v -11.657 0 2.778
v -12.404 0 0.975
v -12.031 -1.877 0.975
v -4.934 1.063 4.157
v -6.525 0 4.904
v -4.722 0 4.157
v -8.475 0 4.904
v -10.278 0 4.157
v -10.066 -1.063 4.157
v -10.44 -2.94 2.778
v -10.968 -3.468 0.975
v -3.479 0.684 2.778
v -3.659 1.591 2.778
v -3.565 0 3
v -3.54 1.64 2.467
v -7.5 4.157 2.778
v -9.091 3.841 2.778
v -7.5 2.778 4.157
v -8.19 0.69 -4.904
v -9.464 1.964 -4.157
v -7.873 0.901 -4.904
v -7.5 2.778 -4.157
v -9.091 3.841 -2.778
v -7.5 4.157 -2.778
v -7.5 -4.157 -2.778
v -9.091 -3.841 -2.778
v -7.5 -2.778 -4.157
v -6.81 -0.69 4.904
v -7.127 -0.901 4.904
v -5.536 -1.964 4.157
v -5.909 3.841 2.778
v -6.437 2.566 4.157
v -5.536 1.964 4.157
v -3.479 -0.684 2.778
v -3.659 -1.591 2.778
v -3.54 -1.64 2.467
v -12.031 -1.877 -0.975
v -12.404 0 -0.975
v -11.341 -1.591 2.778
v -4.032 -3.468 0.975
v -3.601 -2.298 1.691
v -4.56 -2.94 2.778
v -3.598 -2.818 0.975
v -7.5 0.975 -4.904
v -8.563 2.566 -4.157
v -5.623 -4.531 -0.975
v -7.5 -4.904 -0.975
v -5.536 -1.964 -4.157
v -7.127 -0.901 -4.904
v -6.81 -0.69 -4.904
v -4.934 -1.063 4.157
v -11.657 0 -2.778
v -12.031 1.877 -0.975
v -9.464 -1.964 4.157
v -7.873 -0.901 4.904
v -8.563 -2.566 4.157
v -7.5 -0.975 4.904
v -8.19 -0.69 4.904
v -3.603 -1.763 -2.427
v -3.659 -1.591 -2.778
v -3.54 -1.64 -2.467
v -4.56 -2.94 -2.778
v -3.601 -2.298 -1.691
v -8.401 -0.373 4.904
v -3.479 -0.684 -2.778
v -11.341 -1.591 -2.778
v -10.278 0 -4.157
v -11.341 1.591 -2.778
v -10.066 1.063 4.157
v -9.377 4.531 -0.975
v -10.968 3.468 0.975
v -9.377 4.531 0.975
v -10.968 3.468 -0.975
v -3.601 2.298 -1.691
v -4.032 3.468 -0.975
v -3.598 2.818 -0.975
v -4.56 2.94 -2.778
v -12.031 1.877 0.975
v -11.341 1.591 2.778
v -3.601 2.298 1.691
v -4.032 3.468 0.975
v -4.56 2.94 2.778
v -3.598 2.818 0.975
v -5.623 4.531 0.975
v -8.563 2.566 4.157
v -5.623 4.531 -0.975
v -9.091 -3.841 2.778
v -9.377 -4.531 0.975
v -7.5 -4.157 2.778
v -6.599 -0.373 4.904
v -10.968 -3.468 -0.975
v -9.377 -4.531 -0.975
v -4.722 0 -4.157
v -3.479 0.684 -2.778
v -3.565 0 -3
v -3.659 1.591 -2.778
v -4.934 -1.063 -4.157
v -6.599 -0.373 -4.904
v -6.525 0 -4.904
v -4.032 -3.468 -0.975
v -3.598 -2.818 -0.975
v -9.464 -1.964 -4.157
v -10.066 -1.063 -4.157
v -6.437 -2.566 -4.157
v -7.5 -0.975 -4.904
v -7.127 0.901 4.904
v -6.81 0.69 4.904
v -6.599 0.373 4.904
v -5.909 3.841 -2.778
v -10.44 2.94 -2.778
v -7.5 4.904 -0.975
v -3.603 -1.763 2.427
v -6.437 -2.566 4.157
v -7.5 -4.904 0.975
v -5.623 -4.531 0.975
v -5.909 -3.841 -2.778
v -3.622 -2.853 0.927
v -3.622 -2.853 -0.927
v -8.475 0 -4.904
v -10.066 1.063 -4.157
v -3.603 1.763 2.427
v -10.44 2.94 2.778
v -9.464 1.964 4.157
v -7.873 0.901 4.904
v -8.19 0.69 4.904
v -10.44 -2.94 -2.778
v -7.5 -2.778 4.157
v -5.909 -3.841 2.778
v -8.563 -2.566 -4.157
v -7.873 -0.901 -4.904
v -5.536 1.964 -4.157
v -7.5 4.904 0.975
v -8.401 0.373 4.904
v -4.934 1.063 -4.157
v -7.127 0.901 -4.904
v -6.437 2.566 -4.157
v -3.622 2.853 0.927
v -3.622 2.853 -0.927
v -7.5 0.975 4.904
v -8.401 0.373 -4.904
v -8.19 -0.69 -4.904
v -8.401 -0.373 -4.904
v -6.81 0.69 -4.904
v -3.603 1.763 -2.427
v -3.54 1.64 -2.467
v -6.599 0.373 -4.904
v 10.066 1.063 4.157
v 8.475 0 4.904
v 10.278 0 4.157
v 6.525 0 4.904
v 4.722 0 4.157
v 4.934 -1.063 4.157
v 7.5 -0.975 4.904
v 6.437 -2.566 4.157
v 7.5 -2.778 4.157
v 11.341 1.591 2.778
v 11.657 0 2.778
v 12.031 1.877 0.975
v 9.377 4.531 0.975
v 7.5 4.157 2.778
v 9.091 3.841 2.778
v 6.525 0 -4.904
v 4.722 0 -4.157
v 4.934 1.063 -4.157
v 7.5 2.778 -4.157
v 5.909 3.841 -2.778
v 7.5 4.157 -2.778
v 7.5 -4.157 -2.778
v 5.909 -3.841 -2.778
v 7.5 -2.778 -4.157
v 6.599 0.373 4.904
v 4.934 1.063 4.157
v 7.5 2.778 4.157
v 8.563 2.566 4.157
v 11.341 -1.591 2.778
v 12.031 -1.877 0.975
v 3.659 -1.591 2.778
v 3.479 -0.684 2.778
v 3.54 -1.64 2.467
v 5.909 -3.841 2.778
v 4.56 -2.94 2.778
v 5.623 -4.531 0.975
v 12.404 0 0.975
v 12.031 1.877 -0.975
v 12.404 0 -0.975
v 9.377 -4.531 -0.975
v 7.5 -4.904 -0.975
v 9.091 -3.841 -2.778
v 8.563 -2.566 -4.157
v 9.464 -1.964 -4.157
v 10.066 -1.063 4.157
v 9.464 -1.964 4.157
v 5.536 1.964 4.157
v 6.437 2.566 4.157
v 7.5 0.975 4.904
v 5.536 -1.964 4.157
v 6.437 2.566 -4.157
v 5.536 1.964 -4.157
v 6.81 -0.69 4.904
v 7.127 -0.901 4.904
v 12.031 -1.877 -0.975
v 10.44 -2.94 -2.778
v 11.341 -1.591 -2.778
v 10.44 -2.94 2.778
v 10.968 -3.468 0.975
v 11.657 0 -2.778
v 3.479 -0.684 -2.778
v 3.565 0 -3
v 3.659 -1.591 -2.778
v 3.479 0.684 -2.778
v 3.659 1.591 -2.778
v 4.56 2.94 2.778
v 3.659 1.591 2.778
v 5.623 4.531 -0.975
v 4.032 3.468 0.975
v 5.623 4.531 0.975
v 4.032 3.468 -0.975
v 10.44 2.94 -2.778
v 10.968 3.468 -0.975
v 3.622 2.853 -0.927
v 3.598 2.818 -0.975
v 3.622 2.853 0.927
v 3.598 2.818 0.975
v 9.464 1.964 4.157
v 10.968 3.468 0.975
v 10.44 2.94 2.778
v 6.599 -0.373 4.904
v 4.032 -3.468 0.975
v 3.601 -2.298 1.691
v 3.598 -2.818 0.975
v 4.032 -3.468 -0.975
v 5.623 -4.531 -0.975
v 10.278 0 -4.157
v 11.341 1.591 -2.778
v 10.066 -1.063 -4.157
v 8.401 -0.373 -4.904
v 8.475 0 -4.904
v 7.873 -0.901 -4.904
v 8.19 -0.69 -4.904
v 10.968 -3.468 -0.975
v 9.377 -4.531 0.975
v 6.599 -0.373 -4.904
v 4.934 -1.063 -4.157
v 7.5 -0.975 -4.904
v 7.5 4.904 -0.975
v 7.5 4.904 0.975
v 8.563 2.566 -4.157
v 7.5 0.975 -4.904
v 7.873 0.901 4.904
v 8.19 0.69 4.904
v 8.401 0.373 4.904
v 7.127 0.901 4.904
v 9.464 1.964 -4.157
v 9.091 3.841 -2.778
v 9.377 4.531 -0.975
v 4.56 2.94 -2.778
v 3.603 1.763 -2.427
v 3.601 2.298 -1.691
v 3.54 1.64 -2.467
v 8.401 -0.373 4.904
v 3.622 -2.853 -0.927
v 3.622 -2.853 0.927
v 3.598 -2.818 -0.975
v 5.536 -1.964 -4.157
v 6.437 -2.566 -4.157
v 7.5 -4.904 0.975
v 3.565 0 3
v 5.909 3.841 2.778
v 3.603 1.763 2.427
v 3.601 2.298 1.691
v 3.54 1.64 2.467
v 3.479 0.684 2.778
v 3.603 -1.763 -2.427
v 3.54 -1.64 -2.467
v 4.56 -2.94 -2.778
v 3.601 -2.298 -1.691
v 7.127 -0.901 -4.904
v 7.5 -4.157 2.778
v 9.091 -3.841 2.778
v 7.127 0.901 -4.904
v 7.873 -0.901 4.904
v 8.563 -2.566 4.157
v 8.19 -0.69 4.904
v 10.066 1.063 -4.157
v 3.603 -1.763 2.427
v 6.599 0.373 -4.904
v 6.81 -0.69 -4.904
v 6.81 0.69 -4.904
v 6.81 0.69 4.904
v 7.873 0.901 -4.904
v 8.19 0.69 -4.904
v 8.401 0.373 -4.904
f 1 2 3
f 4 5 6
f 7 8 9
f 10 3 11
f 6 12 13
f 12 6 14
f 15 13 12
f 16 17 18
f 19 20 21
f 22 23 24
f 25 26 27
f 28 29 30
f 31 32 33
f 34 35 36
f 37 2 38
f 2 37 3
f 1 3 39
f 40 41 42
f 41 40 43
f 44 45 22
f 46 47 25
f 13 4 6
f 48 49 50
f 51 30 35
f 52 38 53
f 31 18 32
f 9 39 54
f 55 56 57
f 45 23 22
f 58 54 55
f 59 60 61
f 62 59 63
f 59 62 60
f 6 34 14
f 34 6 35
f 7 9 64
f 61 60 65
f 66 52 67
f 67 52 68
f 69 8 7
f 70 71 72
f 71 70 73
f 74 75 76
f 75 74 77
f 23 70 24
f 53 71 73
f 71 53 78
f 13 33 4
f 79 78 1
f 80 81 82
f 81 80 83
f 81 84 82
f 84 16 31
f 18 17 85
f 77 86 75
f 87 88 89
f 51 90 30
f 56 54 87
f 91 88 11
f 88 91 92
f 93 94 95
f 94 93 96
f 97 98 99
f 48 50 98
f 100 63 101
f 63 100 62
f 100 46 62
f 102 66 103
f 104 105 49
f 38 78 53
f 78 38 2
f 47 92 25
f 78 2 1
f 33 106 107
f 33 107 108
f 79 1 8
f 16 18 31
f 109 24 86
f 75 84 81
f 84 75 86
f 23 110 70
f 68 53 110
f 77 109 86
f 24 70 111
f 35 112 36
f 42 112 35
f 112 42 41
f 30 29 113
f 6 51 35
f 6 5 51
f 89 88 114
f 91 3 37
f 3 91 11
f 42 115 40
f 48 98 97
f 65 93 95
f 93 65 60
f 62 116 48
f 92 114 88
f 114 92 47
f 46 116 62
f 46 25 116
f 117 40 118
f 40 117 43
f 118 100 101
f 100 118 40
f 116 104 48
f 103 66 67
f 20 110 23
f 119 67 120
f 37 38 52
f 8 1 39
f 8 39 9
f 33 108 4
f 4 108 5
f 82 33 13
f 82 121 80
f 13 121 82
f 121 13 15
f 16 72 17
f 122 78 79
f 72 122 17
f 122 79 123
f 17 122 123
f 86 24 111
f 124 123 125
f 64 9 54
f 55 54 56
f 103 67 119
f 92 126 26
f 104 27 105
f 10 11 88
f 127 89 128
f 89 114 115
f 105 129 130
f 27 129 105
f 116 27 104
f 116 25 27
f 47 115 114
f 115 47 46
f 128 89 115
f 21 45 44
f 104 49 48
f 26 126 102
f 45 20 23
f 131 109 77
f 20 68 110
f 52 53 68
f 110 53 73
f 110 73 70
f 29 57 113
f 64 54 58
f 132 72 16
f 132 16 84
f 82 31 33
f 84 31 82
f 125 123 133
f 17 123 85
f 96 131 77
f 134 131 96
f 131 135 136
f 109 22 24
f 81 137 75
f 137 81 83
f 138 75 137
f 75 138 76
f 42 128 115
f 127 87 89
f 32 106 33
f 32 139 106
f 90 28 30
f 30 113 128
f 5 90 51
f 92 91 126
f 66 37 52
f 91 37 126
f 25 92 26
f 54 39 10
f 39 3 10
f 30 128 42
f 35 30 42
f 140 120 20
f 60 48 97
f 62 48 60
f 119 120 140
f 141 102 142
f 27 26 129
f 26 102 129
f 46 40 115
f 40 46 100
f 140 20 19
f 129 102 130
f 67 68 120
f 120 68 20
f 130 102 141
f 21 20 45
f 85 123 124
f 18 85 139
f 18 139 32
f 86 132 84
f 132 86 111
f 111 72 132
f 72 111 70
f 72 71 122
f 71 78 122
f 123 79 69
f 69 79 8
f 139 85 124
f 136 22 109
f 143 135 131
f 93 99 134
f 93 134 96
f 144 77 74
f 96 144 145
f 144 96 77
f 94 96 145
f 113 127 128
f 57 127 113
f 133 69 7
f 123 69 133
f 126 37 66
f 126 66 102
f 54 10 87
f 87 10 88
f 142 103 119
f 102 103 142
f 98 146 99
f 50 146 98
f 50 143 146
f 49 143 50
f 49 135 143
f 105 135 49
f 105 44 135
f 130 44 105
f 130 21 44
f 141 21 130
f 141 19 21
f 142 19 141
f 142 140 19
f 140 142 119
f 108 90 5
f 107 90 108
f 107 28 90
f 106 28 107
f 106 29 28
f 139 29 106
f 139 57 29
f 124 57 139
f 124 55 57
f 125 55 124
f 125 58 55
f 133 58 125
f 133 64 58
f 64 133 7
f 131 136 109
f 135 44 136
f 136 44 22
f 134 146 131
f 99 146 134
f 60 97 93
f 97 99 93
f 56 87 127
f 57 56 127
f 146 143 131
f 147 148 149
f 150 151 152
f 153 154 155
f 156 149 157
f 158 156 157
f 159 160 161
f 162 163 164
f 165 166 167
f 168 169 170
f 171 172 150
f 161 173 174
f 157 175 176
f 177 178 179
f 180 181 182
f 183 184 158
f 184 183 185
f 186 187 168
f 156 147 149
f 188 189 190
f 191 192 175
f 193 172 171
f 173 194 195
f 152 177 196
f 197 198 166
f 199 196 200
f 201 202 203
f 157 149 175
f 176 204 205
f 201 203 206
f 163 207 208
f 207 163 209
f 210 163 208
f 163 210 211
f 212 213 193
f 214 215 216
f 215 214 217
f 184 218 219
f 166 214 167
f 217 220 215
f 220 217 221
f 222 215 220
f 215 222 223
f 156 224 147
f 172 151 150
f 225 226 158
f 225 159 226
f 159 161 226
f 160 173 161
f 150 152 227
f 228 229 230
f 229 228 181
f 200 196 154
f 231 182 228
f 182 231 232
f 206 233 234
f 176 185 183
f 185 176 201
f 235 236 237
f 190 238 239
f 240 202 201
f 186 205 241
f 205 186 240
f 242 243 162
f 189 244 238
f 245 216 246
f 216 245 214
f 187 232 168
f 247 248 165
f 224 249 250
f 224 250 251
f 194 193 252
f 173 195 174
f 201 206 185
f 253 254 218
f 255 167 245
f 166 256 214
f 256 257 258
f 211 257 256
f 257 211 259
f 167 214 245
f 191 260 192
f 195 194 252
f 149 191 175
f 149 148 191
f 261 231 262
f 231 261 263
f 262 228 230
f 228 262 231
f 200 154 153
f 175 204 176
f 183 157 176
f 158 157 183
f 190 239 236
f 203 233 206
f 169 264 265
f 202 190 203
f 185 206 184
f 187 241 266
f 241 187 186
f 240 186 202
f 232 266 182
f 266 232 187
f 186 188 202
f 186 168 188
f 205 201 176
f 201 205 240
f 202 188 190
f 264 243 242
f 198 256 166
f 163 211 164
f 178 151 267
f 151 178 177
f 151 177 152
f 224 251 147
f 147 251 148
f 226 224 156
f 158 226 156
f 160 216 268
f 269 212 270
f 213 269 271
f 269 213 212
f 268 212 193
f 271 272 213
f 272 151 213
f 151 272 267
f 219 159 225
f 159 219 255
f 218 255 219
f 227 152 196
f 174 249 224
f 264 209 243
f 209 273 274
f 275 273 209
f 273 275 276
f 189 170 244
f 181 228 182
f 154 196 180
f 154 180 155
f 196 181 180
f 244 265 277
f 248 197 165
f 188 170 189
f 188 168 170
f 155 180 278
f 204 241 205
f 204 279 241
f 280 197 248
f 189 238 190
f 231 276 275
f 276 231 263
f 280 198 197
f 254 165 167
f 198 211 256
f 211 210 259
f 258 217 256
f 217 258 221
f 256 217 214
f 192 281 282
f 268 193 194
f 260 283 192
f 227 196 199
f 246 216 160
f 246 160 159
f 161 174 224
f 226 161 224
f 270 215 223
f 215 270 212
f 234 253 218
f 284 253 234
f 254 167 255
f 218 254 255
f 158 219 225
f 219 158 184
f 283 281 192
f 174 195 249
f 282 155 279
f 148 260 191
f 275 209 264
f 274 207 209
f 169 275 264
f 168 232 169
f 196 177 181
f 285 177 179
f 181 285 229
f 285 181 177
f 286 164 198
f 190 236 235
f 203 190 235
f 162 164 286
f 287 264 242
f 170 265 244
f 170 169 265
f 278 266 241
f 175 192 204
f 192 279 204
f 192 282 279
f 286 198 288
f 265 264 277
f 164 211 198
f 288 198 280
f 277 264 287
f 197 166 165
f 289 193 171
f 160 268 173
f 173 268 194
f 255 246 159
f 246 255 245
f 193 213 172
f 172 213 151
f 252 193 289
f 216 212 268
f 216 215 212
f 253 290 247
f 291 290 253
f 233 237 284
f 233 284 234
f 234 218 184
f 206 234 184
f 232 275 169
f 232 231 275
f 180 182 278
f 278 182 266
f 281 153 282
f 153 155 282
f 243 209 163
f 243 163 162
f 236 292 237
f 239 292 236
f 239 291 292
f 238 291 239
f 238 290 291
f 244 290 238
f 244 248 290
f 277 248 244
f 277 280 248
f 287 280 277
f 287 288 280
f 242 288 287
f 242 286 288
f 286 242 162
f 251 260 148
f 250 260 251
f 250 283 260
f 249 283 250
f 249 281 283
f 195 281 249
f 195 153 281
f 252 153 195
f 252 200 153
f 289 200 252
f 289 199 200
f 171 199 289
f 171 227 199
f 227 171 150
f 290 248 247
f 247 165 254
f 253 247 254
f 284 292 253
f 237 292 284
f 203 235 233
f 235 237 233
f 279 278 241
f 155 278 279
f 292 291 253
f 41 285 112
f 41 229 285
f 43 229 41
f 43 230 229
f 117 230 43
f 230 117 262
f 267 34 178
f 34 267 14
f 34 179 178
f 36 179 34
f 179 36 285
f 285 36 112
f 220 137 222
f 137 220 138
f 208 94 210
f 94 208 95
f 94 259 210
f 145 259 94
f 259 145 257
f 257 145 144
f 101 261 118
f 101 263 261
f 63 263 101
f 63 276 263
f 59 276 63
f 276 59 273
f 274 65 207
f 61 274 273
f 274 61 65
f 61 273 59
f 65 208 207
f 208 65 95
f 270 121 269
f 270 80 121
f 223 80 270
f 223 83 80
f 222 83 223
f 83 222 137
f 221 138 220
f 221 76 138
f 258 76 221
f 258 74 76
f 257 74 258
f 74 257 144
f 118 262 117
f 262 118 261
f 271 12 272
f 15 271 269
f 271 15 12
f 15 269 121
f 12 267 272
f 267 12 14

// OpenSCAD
// Dumbbell parameters
r_sphere = 5;      // Radius of the spheres
r_bar    = 3;      // Radius of the connecting bar
len_bar  = 15;     // Total length of the bar (from sphere to sphere)

// Calculate sphere positions based on the bar length
x_left  = -len_bar / 2;
x_right =  len_bar / 2;

// Create the dumbbell using a union
union() {
    // Left sphere
    translate([x_left, 0, 0]) sphere(r = r_sphere);
    
    // Right sphere
    translate([x_right, 0, 0]) sphere(r = r_sphere);
    
    // Connecting cylinder (bar)
    // Cylinder along X‑axis: rotate the default Z‑axis cylinder by 90° around Y
    rotate([0, 90, 0]) cylinder(h = len_bar, r = r_bar, center = true);
}
